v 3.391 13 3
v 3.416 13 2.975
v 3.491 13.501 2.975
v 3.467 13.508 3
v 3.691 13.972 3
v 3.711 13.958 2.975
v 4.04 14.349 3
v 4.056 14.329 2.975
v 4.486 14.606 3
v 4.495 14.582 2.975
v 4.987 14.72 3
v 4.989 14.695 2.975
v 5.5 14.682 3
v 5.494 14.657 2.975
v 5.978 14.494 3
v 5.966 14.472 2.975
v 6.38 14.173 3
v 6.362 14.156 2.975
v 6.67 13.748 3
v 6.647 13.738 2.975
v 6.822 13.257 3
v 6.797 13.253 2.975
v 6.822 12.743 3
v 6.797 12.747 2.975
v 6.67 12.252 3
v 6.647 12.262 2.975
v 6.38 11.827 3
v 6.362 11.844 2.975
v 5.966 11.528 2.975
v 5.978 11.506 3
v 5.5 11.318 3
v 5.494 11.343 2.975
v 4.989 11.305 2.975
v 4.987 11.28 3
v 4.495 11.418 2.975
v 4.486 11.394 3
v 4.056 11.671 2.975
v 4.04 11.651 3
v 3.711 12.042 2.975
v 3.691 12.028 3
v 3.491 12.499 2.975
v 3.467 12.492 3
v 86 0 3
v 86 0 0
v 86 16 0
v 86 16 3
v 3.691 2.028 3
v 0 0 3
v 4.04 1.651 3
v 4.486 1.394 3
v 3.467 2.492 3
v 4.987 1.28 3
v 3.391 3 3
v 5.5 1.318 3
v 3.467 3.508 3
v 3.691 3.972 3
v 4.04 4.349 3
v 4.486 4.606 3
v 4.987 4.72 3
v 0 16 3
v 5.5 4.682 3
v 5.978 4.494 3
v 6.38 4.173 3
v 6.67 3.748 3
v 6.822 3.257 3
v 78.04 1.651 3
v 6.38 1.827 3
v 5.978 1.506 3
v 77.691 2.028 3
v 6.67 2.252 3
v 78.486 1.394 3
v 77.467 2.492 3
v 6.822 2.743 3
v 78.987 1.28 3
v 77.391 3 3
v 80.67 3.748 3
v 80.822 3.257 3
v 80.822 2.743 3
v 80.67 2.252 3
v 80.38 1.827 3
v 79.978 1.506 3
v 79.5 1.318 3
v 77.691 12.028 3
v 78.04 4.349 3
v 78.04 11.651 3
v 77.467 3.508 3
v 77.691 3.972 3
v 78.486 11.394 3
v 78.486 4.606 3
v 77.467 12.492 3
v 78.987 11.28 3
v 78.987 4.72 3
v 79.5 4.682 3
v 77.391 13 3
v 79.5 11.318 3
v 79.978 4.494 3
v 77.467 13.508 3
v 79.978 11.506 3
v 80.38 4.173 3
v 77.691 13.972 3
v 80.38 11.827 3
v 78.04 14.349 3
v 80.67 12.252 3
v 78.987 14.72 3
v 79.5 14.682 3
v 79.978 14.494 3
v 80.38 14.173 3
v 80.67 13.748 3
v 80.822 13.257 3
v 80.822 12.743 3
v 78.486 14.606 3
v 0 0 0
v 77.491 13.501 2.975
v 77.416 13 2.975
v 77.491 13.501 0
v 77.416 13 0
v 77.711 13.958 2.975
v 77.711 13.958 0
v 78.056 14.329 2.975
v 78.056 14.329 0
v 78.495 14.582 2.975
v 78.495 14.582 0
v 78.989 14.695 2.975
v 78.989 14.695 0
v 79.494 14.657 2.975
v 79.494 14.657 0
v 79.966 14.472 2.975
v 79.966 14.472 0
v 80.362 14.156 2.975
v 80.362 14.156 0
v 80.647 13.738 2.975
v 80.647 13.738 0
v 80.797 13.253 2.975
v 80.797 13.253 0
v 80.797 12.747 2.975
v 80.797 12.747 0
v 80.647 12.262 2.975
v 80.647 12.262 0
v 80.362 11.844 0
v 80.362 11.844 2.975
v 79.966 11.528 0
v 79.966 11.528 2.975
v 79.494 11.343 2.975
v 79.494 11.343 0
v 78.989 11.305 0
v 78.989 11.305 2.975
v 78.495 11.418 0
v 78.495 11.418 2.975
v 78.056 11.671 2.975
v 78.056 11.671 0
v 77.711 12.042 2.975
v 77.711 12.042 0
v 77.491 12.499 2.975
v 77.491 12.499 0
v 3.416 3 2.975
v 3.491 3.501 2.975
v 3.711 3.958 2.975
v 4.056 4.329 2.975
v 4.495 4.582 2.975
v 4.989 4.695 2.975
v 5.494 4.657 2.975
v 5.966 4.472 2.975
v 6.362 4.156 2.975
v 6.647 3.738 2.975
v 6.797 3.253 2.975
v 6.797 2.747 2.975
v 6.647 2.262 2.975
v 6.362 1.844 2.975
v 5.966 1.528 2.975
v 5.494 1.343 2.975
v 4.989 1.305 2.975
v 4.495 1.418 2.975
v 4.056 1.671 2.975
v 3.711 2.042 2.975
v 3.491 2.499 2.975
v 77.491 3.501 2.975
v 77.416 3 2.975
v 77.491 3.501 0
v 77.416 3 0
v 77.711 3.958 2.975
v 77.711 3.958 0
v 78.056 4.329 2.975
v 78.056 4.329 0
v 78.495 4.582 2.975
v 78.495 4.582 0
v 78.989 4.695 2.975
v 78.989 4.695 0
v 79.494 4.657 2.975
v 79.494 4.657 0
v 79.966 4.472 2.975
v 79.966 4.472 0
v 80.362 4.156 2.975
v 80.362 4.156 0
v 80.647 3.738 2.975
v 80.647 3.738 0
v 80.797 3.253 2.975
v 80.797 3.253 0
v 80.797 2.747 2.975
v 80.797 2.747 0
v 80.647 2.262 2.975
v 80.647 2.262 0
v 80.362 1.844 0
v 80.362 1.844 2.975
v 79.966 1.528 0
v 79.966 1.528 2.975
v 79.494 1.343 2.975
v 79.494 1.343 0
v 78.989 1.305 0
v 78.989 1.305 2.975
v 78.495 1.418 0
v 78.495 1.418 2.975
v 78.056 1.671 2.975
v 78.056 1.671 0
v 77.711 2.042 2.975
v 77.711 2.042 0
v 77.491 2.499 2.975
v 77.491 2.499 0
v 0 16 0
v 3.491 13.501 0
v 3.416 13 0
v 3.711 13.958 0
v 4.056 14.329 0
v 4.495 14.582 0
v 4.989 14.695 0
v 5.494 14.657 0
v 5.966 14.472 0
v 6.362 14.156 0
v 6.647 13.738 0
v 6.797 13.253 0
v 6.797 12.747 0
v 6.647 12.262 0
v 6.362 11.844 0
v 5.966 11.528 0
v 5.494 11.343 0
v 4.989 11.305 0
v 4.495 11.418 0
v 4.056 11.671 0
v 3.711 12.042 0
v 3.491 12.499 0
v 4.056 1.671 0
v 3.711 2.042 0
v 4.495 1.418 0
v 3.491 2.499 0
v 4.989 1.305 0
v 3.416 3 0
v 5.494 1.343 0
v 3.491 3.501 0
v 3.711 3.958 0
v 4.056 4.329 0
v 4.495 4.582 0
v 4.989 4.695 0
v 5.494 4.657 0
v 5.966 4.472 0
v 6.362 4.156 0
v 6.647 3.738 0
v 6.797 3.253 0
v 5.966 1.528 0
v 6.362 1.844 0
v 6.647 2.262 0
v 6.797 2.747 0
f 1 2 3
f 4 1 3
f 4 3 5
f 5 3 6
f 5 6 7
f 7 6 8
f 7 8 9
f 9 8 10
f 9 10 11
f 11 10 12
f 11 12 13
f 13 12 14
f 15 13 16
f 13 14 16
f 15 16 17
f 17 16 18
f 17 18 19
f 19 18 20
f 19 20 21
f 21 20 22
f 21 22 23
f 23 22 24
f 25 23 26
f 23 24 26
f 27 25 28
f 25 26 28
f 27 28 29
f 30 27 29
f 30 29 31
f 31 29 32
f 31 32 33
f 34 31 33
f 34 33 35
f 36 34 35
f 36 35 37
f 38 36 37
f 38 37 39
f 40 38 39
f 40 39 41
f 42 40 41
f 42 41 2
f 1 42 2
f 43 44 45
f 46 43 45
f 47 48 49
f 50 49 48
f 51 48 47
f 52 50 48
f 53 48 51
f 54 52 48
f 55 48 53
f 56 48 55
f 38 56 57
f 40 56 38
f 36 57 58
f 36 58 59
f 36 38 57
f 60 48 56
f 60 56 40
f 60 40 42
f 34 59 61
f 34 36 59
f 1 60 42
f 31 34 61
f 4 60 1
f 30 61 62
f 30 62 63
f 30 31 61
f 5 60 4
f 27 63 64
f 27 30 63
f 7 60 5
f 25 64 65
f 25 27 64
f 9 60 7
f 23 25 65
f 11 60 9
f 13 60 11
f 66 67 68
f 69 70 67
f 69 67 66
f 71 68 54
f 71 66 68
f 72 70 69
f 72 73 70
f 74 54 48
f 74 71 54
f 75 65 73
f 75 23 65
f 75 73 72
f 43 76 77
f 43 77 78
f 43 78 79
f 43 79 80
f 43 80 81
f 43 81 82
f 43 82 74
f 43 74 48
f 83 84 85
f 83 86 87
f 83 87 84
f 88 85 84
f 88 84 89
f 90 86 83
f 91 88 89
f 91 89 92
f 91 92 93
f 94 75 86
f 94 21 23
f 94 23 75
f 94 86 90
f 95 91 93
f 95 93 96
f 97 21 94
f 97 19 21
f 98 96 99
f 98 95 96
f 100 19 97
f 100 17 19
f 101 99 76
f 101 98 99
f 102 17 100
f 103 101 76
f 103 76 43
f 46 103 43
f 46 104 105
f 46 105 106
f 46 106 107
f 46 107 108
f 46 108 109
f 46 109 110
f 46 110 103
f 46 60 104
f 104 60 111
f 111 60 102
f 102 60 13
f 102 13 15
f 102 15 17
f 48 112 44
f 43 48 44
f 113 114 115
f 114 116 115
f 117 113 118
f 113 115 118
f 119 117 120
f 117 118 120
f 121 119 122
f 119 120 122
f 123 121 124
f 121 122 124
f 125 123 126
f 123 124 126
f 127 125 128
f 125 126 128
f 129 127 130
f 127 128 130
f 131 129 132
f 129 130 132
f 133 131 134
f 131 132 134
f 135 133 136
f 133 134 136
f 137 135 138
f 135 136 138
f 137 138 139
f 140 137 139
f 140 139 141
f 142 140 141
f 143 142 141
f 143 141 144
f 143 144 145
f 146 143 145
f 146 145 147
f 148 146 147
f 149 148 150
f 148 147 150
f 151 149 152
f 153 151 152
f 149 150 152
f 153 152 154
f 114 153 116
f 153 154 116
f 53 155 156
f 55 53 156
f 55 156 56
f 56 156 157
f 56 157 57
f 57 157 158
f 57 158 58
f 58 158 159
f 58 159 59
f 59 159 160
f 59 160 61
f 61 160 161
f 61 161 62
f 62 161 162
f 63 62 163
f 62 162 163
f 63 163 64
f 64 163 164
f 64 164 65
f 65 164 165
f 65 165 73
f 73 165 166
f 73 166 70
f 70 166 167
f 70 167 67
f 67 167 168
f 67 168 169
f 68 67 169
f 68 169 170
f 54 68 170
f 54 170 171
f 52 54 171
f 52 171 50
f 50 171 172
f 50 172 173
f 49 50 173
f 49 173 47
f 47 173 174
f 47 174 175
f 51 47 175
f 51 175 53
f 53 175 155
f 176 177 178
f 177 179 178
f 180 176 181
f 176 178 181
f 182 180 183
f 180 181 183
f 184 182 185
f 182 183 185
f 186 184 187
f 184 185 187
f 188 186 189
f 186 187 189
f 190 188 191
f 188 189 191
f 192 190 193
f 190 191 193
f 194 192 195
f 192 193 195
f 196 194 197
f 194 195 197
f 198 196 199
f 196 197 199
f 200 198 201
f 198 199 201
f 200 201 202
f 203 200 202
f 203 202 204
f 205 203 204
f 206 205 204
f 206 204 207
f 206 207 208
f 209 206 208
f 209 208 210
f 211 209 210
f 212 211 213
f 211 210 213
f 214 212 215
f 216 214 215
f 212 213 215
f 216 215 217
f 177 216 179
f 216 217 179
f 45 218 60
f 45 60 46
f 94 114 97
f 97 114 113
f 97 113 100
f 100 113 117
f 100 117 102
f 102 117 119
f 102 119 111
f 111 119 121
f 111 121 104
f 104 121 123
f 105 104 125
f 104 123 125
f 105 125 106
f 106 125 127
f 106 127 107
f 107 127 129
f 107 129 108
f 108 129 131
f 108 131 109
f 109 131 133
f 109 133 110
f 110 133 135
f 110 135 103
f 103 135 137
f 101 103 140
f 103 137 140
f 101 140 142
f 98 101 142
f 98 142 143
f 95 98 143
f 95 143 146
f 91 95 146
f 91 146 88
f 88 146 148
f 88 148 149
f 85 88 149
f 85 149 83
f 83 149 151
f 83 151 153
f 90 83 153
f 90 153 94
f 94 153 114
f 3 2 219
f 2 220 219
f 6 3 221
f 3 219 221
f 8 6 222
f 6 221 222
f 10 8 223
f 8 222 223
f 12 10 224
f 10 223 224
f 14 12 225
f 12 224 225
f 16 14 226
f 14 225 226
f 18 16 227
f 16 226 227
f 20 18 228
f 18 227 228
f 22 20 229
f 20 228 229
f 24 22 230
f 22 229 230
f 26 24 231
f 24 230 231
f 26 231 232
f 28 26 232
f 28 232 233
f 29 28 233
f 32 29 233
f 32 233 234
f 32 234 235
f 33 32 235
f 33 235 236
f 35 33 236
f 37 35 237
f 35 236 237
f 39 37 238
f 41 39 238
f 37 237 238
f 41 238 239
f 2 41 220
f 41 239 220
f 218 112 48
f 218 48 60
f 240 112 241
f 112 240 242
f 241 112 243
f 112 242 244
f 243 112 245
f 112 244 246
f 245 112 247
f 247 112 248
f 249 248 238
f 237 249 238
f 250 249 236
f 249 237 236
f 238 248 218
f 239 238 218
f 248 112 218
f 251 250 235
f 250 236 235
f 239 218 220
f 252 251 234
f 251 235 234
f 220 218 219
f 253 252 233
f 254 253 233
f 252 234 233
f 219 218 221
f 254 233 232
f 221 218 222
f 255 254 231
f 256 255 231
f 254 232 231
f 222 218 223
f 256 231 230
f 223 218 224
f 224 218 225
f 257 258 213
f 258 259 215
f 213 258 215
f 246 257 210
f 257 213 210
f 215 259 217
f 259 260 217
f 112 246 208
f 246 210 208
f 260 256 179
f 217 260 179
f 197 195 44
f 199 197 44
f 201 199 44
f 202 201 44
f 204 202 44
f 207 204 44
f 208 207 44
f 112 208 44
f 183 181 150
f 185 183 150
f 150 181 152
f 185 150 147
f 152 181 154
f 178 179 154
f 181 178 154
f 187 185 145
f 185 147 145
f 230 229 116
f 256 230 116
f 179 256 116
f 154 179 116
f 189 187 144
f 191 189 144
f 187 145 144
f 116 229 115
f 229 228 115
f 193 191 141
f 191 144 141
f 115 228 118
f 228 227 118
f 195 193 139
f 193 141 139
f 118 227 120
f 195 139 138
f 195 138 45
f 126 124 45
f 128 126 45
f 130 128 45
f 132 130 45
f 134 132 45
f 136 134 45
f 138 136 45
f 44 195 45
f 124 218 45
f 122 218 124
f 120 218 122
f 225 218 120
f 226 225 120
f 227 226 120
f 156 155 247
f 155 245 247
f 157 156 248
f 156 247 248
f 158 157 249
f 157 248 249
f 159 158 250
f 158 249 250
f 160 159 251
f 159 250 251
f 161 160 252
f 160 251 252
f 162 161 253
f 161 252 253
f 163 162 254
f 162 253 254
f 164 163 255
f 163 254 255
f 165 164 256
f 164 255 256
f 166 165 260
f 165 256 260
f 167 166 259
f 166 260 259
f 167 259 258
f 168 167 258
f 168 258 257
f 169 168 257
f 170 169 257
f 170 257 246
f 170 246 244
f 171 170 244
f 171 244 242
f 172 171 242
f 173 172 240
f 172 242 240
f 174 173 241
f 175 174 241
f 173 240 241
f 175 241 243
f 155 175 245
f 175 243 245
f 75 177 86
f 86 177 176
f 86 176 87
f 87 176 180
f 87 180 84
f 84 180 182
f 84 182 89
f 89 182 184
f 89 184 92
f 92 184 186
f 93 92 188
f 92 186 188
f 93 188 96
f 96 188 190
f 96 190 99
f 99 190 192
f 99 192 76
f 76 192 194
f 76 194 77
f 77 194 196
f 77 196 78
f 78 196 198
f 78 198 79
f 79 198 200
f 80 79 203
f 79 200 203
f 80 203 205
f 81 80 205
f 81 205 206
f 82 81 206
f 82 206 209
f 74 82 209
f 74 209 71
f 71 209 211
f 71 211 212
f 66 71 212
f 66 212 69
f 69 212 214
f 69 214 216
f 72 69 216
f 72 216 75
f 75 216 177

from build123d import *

# Parameters (mm, degrees)
SKETCH1_W                      = 86
SKETCH1_H                      = 16
BOSS_EXTRUDE1_DEPTH            = 3
M3_CLEARANCE_HOLE1_D           = 3.4
M3_CLEARANCE_HOLE1_CSINK_D     = 3.45
M3_CLEARANCE_HOLE1_CSINK_ANGLE = 90


with BuildPart() as part:
    # Sketch1 → Boss-Extrude1 (new body)
    with BuildSketch(Plane.XY):
        with Locations((43, 8)):
            Rectangle(SKETCH1_W, SKETCH1_H)
    extrude(amount=BOSS_EXTRUDE1_DEPTH)

    # M3 Clearance Hole1 (through all)
    with Locations(Plane.XY.offset(3)):
        with Locations((5.115834522, 13), (5.115834522, 3), (79.115834522, 13), (79.115834522, 3)):
            CounterSinkHole(M3_CLEARANCE_HOLE1_D / 2, M3_CLEARANCE_HOLE1_CSINK_D / 2, counter_sink_angle=M3_CLEARANCE_HOLE1_CSINK_ANGLE)


solid = part.part
